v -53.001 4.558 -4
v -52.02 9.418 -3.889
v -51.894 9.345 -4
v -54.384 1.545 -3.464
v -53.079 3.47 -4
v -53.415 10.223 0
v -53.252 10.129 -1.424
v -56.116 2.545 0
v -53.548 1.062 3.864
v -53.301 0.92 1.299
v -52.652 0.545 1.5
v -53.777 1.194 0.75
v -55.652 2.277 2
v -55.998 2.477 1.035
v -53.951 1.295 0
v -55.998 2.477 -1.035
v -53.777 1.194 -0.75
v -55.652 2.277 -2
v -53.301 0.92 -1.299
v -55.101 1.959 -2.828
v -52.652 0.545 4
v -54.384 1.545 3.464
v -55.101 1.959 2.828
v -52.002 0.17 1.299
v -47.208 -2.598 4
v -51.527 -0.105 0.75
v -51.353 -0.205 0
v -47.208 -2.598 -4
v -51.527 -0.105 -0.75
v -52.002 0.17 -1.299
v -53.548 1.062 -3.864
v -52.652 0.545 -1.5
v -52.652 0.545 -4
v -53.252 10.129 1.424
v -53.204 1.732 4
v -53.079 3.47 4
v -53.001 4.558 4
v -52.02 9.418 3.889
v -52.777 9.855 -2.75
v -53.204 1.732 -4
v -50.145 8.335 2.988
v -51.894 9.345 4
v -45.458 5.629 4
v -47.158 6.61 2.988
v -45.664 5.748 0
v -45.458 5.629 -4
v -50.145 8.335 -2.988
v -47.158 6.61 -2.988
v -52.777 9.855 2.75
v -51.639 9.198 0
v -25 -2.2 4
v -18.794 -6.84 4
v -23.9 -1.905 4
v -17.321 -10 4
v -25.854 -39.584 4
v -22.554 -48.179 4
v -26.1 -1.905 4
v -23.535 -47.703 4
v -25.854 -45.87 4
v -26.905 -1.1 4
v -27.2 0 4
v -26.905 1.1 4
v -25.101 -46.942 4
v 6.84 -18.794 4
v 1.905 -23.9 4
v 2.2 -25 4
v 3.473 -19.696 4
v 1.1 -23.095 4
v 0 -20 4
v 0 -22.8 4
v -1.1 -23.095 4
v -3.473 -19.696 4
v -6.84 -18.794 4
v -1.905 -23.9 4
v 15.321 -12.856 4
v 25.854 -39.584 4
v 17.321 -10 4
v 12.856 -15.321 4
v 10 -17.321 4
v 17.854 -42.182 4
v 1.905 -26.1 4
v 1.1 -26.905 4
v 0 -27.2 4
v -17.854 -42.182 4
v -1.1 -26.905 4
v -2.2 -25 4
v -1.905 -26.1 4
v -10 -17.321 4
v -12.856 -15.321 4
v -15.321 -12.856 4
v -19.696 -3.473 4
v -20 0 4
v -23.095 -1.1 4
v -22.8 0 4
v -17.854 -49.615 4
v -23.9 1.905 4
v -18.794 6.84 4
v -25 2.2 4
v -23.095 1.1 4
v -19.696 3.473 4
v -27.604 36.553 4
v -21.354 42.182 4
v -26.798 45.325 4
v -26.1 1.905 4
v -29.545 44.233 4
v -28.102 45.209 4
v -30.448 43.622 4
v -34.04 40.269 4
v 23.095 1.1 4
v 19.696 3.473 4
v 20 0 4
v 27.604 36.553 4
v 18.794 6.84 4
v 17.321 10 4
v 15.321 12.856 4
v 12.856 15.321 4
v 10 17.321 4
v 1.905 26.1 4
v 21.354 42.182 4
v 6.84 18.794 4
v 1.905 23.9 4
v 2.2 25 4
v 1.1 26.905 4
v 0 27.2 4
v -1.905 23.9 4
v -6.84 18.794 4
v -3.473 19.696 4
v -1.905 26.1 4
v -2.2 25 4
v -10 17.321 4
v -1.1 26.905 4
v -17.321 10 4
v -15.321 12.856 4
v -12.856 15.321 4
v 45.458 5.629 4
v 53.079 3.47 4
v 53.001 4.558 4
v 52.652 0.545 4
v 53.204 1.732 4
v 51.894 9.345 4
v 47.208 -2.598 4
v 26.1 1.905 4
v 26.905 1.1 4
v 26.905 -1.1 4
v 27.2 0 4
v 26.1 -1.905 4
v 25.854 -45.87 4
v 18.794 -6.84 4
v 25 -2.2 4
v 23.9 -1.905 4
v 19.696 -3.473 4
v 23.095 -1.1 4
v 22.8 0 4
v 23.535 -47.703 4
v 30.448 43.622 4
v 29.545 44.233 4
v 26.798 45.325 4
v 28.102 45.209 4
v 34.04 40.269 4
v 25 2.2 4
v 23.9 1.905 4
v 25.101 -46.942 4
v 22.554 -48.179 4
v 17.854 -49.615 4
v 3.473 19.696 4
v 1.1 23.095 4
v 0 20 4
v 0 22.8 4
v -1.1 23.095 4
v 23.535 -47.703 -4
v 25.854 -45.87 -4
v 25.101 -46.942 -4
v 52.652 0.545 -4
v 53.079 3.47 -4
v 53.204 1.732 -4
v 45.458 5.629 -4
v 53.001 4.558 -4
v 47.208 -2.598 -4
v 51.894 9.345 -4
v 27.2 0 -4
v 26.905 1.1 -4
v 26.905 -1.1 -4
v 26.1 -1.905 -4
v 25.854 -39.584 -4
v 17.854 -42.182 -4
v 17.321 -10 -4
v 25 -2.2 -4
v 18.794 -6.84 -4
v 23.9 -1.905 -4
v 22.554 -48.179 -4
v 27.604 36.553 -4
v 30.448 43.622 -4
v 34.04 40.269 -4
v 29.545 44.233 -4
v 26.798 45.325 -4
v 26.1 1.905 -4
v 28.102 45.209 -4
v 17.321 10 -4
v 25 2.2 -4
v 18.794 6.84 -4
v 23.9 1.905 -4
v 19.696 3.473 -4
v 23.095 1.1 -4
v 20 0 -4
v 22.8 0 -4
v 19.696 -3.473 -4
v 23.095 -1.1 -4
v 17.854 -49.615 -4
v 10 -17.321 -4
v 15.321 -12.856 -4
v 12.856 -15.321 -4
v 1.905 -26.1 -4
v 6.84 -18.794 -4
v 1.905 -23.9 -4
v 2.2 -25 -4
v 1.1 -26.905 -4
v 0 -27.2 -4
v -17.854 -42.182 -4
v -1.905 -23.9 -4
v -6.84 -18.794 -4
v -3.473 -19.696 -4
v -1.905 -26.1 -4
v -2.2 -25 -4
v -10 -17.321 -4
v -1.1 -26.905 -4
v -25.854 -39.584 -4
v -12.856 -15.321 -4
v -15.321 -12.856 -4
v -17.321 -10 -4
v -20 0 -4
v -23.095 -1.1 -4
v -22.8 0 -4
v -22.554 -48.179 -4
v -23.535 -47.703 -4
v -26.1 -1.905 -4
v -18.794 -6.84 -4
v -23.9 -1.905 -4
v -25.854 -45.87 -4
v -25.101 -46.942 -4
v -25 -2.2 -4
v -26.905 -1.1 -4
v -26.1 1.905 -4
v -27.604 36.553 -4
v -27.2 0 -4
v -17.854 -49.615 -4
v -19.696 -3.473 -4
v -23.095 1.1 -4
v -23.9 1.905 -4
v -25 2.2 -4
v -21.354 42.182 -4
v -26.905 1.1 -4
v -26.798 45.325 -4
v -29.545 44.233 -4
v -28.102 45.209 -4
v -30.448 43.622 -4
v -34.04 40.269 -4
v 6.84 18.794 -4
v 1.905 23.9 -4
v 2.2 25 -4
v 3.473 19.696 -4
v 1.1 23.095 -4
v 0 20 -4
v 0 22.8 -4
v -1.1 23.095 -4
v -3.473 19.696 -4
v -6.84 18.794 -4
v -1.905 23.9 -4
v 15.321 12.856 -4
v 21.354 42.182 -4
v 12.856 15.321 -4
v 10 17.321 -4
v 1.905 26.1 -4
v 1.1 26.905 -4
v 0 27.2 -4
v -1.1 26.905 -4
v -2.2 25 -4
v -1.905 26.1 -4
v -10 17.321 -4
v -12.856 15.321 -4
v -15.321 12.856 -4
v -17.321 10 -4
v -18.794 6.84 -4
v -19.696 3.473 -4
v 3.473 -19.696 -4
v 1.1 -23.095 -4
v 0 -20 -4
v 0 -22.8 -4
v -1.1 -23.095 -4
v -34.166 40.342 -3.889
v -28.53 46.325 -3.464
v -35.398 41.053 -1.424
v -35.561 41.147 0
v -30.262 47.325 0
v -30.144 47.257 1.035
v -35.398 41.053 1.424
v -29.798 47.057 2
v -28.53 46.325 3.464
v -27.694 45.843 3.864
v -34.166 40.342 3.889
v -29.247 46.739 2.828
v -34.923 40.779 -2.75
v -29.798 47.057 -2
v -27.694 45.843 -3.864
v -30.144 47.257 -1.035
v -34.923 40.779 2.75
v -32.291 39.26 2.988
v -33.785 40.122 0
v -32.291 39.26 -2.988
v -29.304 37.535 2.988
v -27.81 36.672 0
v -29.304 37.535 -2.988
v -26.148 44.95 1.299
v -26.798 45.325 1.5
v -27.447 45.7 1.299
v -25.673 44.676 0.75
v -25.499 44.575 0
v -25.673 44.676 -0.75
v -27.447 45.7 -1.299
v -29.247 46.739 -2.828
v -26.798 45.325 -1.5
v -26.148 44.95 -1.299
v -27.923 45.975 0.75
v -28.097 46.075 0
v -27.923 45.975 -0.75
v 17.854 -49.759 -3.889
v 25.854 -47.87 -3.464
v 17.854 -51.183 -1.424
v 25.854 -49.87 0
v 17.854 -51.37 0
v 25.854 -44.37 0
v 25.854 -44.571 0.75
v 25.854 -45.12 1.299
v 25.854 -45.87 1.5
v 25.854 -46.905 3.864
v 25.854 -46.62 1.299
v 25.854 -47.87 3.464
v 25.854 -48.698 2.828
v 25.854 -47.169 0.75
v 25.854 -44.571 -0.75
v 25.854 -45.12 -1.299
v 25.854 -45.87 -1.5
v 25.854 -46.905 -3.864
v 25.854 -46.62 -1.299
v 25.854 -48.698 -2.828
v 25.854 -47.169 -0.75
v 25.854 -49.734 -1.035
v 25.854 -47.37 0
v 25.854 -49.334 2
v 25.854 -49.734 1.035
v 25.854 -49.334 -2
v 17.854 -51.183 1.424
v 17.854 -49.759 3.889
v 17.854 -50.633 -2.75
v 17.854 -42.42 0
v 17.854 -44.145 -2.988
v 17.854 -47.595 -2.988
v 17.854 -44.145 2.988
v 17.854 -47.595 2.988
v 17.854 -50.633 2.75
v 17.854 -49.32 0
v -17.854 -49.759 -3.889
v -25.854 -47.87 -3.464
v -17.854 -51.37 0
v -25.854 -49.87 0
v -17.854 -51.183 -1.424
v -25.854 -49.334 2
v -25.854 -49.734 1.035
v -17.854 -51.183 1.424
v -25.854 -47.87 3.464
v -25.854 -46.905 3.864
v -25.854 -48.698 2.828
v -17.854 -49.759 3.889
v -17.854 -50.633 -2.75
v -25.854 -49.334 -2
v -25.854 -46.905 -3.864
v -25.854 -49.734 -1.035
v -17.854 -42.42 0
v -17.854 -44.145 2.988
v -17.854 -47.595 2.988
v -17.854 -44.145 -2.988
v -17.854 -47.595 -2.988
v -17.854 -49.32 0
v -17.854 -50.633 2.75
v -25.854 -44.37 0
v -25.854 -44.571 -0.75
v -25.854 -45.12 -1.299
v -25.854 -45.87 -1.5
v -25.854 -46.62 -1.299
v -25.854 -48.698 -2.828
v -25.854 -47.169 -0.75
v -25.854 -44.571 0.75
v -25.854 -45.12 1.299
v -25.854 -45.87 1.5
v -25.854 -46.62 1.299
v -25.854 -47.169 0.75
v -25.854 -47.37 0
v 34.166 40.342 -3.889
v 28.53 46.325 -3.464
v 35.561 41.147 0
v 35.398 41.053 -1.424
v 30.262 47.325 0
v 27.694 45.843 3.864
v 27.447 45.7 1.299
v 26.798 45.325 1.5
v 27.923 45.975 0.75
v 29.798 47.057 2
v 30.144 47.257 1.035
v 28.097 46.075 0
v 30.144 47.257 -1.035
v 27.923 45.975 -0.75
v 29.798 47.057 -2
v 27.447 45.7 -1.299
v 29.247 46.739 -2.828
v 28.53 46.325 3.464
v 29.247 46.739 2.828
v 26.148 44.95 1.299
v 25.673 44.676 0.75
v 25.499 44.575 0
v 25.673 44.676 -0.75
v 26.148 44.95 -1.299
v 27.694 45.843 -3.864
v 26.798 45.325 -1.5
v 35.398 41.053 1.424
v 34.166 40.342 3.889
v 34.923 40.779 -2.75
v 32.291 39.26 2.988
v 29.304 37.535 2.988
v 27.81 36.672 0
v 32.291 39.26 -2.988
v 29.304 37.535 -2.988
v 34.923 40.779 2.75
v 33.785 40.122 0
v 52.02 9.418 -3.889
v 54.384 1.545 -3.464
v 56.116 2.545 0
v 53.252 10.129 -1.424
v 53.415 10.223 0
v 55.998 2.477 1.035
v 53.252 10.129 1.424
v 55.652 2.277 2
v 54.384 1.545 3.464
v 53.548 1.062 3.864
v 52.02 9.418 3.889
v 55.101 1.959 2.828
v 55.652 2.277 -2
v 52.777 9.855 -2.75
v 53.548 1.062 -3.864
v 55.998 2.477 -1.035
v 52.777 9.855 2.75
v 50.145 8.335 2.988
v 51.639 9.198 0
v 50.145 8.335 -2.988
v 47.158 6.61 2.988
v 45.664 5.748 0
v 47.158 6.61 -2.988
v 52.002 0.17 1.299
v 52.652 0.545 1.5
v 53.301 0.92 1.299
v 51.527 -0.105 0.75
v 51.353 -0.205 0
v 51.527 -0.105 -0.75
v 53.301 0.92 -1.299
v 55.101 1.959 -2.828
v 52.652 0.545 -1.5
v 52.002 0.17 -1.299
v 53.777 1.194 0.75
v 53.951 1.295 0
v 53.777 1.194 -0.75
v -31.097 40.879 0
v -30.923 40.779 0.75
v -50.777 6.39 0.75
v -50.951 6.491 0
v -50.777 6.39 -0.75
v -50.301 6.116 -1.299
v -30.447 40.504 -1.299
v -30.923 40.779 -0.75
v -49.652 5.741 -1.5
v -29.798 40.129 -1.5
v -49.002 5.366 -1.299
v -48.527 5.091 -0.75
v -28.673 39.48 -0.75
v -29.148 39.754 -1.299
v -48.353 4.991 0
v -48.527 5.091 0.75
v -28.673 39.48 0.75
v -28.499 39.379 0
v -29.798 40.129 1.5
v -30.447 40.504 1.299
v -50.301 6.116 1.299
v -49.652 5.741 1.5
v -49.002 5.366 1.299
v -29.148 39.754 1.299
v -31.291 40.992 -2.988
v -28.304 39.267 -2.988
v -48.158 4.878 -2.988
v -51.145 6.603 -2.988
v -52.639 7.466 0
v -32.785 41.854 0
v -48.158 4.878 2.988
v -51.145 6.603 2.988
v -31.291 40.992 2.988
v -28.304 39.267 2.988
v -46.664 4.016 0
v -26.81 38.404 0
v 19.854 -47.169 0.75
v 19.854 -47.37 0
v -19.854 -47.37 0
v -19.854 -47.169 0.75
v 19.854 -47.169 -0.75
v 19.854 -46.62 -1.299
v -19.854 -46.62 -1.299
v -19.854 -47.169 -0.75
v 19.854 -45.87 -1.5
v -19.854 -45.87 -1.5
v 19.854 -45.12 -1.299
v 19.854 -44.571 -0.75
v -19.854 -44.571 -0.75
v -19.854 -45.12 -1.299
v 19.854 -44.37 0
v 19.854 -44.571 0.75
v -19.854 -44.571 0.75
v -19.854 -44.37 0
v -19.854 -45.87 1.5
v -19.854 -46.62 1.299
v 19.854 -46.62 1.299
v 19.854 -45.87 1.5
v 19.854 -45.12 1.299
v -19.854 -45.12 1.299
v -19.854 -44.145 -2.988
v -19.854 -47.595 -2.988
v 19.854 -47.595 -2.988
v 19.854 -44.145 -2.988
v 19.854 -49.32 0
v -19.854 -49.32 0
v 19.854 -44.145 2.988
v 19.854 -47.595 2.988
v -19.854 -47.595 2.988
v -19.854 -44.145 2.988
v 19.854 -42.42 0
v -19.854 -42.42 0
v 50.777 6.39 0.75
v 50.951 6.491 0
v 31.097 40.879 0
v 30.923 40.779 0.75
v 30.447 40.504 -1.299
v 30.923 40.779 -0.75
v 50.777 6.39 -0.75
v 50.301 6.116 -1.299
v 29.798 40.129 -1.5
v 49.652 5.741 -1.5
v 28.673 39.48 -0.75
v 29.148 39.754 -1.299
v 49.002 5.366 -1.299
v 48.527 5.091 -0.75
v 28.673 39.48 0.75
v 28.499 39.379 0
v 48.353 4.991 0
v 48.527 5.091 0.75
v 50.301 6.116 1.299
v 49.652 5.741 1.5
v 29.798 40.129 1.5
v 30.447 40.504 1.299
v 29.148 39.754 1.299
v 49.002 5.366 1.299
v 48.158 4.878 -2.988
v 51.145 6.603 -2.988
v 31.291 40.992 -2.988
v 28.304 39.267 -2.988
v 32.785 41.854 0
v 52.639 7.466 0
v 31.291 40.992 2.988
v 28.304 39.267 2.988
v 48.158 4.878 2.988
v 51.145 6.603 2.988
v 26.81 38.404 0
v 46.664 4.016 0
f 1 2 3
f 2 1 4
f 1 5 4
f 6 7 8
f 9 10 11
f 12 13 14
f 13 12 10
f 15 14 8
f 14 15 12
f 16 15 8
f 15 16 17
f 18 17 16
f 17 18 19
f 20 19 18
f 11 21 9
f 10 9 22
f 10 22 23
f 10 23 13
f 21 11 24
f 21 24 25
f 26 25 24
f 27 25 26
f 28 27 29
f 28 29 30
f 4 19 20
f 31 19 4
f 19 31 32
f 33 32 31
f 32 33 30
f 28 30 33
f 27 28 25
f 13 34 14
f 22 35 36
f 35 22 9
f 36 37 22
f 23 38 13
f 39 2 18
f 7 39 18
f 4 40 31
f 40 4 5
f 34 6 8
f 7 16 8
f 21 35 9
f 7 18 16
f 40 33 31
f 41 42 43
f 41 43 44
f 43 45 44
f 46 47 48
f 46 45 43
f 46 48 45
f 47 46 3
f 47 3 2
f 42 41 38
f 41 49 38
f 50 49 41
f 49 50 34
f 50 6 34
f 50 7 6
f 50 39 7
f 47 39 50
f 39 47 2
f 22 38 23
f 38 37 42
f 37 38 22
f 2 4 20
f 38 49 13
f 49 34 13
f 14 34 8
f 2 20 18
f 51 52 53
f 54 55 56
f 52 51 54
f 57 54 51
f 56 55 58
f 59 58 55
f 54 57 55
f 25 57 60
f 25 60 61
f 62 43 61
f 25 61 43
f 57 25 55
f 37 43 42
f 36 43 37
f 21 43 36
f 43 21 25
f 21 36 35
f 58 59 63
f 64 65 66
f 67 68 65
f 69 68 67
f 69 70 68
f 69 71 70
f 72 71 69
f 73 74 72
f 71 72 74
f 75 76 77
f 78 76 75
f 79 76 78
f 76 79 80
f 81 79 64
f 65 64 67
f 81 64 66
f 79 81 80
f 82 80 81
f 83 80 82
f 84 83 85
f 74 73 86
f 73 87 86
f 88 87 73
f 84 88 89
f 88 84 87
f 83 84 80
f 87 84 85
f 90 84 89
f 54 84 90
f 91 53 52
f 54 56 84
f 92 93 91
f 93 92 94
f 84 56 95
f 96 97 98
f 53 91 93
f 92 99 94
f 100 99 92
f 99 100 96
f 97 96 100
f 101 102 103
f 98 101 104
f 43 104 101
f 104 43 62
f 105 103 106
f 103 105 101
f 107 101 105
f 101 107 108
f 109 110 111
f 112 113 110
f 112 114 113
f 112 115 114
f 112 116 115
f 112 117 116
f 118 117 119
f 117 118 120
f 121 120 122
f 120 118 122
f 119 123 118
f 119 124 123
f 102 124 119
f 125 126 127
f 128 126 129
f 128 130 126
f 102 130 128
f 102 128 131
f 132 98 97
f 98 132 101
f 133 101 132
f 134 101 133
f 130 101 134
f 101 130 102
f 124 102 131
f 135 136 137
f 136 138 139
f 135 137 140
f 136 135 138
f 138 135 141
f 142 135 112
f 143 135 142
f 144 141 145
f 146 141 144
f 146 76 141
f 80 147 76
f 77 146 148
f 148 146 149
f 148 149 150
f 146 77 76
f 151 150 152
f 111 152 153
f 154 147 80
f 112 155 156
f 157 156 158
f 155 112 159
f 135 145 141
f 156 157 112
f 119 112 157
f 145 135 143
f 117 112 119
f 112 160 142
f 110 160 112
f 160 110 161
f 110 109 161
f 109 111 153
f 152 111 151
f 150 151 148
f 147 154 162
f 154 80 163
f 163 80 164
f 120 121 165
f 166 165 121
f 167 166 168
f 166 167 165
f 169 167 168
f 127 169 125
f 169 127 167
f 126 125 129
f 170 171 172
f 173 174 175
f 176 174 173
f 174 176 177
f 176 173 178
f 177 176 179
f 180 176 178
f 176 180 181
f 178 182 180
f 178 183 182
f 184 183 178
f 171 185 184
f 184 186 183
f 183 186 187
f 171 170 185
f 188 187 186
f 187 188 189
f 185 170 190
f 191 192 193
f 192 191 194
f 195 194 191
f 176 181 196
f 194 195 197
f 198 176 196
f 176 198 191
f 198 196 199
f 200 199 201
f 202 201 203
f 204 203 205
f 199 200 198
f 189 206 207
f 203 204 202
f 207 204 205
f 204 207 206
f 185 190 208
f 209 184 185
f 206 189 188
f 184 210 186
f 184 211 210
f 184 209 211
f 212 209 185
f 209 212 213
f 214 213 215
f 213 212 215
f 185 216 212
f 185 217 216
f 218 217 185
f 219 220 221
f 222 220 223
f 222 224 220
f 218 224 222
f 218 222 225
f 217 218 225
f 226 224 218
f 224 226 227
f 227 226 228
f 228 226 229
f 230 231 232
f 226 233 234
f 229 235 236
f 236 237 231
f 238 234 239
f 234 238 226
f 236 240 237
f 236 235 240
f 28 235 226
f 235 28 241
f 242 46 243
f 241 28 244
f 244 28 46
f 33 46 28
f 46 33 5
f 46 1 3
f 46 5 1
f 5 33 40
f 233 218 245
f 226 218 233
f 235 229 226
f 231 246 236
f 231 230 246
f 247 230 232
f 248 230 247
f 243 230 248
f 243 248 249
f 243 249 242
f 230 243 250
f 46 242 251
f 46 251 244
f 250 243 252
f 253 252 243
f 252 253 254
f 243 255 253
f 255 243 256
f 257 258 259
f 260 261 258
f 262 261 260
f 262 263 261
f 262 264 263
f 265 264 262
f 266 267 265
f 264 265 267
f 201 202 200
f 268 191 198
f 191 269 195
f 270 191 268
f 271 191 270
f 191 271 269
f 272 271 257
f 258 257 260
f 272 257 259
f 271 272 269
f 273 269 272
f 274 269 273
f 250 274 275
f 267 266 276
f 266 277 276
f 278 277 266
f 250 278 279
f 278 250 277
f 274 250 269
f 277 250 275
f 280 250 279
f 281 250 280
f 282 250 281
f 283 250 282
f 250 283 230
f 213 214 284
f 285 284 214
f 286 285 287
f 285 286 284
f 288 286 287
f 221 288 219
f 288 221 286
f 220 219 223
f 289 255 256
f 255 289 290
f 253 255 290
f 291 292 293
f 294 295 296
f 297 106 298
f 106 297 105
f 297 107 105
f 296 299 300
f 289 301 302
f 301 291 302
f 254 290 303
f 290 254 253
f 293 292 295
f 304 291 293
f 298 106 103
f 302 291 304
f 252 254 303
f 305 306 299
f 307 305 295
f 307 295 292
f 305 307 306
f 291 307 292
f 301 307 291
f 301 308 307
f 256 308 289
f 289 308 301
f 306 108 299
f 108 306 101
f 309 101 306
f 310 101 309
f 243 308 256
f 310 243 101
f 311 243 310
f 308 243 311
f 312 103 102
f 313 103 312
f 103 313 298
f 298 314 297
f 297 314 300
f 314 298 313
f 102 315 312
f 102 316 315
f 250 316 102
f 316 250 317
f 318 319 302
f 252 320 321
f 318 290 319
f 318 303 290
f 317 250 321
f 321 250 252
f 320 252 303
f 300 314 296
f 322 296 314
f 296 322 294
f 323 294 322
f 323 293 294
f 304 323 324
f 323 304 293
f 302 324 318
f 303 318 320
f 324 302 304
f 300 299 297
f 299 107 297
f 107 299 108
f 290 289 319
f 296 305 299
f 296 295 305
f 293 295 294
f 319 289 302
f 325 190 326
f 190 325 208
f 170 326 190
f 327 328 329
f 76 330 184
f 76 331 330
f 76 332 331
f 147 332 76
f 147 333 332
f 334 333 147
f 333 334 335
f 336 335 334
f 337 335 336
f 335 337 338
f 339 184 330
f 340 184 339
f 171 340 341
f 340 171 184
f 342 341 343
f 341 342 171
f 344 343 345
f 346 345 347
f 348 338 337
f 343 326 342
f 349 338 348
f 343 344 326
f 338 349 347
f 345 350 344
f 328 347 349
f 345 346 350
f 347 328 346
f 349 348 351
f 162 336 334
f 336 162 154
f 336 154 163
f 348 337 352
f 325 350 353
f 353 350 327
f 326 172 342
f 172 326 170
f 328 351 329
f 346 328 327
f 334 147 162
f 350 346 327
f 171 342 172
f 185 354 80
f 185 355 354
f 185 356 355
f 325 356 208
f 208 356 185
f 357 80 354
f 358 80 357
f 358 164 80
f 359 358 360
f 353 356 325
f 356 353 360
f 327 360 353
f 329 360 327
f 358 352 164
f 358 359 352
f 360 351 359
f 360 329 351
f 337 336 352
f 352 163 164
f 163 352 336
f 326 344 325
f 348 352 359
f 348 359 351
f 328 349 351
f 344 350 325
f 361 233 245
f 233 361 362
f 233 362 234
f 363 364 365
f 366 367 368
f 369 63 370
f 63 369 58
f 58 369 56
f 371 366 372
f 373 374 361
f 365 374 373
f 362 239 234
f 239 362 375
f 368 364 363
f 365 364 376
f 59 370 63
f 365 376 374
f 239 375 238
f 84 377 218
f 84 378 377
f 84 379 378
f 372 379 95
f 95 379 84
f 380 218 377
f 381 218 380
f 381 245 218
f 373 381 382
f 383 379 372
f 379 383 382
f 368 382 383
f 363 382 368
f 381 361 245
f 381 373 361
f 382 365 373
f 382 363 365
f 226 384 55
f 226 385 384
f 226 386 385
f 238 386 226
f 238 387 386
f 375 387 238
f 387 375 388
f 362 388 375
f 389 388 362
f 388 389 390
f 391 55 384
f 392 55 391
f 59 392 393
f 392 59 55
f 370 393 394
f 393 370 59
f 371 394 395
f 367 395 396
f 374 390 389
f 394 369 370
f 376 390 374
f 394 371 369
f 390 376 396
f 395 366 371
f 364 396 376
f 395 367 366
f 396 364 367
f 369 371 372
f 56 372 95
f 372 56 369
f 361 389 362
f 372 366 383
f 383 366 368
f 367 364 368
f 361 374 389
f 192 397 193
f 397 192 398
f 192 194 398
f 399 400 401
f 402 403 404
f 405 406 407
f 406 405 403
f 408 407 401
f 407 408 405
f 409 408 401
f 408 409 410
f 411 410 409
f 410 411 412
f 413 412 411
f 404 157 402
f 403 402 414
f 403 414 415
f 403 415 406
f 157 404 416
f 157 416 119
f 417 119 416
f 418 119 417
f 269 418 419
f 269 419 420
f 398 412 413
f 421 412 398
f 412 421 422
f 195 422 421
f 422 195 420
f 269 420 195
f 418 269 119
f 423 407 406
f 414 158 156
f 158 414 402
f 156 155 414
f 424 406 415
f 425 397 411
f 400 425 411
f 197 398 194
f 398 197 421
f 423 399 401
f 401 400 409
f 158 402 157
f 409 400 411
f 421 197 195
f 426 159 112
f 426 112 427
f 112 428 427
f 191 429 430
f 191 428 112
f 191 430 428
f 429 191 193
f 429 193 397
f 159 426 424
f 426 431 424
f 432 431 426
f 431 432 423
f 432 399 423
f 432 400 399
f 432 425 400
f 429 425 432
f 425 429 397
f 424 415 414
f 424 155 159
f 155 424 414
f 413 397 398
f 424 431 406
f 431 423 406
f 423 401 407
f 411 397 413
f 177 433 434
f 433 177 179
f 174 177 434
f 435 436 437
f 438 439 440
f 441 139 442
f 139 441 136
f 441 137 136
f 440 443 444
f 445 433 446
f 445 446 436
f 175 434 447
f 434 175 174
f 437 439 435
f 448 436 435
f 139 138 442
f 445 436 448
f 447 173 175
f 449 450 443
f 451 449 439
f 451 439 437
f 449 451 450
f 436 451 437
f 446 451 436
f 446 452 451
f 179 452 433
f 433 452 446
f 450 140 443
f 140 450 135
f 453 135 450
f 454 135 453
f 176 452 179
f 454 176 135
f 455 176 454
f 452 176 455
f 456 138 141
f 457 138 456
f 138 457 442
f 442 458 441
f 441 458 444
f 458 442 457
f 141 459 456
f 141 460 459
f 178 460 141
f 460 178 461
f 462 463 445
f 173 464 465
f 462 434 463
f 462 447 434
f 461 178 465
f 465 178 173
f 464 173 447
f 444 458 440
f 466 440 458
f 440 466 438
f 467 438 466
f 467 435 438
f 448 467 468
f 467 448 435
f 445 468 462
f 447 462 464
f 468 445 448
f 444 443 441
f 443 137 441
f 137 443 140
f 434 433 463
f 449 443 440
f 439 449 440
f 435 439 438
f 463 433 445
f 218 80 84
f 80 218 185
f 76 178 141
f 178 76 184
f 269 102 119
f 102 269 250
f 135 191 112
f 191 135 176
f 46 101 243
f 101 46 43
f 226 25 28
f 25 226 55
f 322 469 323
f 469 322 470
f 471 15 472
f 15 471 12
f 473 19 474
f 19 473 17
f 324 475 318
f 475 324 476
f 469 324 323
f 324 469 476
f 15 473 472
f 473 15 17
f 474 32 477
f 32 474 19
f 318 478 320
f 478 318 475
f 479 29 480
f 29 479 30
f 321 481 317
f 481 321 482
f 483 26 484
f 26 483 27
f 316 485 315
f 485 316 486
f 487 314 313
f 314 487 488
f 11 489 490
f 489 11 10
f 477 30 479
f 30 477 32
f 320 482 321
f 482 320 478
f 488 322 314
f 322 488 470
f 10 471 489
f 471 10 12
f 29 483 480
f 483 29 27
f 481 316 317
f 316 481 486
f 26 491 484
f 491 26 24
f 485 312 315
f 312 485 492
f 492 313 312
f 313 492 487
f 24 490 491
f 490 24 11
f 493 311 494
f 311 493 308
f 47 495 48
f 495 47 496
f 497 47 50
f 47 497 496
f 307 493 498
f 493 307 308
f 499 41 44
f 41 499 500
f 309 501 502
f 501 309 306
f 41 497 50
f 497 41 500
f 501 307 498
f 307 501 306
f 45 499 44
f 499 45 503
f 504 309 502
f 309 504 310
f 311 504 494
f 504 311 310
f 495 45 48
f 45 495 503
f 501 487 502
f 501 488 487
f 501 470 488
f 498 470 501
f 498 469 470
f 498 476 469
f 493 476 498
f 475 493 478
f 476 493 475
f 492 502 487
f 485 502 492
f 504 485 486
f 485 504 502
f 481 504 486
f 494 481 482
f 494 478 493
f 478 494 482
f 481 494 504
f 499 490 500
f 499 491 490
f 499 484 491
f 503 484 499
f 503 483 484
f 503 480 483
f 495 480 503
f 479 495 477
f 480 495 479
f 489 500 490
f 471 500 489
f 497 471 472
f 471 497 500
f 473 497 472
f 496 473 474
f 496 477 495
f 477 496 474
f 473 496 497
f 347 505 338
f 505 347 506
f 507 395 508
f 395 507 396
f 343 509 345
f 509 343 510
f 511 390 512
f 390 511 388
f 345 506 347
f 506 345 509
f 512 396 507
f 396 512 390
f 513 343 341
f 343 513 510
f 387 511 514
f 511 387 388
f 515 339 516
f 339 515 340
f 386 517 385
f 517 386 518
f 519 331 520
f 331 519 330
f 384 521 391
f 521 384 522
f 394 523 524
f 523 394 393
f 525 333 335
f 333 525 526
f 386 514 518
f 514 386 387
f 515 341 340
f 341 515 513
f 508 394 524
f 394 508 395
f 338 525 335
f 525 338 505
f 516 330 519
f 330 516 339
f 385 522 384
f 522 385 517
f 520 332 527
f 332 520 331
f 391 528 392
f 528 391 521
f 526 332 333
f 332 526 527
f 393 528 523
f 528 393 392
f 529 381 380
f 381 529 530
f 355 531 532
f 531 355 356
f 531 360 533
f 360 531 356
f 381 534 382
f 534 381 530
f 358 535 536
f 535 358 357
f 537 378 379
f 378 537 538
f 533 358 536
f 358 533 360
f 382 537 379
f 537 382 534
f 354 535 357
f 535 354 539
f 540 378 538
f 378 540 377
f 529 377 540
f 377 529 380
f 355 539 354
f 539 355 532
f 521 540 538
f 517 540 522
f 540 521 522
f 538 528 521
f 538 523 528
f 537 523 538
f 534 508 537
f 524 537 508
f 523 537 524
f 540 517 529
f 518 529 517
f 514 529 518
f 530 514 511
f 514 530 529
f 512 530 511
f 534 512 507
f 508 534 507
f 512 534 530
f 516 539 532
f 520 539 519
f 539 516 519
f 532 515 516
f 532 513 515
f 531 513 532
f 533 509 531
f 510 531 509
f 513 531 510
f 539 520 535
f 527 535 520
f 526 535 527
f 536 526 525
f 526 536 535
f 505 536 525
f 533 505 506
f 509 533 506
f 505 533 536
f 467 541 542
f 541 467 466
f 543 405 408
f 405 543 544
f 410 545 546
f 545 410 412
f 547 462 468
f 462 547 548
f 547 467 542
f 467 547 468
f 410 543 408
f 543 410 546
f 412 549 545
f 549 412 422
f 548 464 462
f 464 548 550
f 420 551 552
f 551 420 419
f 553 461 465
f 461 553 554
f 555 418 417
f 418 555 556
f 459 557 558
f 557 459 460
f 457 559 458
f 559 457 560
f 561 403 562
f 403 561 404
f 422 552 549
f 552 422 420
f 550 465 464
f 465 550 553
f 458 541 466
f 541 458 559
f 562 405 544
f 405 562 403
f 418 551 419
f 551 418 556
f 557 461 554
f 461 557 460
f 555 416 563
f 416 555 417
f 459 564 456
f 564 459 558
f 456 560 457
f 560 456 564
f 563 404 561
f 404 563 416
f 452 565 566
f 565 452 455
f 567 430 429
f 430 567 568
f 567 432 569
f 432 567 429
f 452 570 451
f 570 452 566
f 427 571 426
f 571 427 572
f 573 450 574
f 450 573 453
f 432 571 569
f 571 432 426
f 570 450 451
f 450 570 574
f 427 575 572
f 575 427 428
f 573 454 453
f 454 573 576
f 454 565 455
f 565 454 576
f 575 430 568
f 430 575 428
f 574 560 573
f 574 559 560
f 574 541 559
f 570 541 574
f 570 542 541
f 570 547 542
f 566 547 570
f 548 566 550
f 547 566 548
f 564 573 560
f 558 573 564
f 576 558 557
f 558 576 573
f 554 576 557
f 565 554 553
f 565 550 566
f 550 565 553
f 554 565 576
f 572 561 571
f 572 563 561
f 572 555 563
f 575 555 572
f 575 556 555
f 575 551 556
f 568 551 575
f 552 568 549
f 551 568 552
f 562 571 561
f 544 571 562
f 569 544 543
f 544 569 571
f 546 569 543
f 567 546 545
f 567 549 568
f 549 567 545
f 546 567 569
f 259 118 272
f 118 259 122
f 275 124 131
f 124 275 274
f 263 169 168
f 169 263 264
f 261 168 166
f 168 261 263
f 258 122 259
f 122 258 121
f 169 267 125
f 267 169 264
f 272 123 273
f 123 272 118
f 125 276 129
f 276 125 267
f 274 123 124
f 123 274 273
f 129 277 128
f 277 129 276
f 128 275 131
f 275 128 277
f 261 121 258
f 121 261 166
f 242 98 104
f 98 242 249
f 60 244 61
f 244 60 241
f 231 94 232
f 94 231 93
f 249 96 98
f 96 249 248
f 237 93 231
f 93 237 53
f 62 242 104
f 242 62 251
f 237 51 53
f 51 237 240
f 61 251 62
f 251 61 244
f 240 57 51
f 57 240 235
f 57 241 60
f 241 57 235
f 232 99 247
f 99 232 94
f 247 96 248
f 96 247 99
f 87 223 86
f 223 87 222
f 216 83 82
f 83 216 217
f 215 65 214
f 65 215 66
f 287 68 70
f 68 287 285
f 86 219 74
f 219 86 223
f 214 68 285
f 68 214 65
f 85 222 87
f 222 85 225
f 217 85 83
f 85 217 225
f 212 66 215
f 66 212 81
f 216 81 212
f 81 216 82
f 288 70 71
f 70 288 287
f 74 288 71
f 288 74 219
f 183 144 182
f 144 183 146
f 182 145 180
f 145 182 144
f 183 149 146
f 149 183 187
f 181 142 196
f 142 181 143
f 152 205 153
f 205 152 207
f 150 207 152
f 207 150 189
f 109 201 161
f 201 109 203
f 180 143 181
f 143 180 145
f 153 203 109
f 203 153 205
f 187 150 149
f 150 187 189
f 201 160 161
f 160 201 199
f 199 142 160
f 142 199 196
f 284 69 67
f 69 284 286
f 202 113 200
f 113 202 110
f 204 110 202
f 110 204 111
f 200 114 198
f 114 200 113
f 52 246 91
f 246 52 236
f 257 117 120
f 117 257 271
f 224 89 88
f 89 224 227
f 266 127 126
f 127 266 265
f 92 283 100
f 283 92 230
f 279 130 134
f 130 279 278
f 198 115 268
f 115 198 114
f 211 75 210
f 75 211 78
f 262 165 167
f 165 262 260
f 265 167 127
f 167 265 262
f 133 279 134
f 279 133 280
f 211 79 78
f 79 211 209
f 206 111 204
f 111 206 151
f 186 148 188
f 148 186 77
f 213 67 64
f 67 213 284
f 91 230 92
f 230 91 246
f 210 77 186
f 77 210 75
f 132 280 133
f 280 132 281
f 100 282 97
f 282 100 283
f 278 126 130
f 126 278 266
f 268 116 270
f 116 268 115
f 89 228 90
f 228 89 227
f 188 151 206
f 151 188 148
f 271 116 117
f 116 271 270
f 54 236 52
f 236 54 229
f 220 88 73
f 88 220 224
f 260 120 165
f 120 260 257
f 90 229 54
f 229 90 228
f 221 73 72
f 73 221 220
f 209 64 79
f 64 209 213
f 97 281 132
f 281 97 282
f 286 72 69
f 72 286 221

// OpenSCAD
// file: configuration.scad
// Increase this if your slicer or printer make holes too tight.
extra_radius = 0.2;

// OD = outside diameter, corner to corner.
m3_nut_od = 6.1;
m3_nut_radius = m3_nut_od/2 + 0.2 + extra_radius;

// Major diameter of metric 3mm thread.
m3_major = 2.85;
m3_radius = m3_major/2 + extra_radius;
m3_wide_radius = m3_major/2 + 0.2 + extra_radius;

// NEMA17 stepper motors.
motor_shaft_diameter = 5;
motor_shaft_radius = motor_shaft_diameter/2 + extra_radius;

// Frame brackets.
thickness = 3.6;
// main file
include <configuration.scad>;

ratio= 1.39;
separation = 37.2*ratio;
radius = 33*ratio;
height = 8;
cone_r1 = height/2;
cone_r2 = 5.5;

echo("Separation= ", separation);

difference() {
  union() {
    cylinder(r=separation-3, h=height, center=true, $fn=6);
    for (a = [60:120:359]) rotate([0, 0, a]) {
      translate([0, radius, 0]) intersection() {
        cube([separation, 20, height], center=true);
        union() {
          for (s = [-1, 1]) scale([s, 1, 1]) {
            translate([separation/2-4, 0, 0]) rotate([0, 90, 0])
              cylinder(r1=cone_r2, r2=cone_r1, h=8, center=true, $fn=24);
            translate([separation/2-4, -5, 0])
              cube([8, 10, height], center=true);
          }
        }
      }
    }
  }
  for (a = [60:120:359]) rotate([0, 0, a]) {
    translate([0, radius, 0]) rotate([0, 90, 0])
      cylinder(r=1.5, h=separation+1, center=true, $fn=12);
    translate([0, radius, 0]) rotate([90, 0, 90])
      cylinder(r=m3_nut_radius, h=separation-12, center=true, $fn=6);
  }
  cylinder(r=20, h=height+1, center=true, $fn=36);
  for (a = [0:90:359]) rotate([0, 0, a]) {
    translate([0, 25, 0])
      cylinder(r=2.2, h=2*height, center=true, $fn=12);
  }
}
